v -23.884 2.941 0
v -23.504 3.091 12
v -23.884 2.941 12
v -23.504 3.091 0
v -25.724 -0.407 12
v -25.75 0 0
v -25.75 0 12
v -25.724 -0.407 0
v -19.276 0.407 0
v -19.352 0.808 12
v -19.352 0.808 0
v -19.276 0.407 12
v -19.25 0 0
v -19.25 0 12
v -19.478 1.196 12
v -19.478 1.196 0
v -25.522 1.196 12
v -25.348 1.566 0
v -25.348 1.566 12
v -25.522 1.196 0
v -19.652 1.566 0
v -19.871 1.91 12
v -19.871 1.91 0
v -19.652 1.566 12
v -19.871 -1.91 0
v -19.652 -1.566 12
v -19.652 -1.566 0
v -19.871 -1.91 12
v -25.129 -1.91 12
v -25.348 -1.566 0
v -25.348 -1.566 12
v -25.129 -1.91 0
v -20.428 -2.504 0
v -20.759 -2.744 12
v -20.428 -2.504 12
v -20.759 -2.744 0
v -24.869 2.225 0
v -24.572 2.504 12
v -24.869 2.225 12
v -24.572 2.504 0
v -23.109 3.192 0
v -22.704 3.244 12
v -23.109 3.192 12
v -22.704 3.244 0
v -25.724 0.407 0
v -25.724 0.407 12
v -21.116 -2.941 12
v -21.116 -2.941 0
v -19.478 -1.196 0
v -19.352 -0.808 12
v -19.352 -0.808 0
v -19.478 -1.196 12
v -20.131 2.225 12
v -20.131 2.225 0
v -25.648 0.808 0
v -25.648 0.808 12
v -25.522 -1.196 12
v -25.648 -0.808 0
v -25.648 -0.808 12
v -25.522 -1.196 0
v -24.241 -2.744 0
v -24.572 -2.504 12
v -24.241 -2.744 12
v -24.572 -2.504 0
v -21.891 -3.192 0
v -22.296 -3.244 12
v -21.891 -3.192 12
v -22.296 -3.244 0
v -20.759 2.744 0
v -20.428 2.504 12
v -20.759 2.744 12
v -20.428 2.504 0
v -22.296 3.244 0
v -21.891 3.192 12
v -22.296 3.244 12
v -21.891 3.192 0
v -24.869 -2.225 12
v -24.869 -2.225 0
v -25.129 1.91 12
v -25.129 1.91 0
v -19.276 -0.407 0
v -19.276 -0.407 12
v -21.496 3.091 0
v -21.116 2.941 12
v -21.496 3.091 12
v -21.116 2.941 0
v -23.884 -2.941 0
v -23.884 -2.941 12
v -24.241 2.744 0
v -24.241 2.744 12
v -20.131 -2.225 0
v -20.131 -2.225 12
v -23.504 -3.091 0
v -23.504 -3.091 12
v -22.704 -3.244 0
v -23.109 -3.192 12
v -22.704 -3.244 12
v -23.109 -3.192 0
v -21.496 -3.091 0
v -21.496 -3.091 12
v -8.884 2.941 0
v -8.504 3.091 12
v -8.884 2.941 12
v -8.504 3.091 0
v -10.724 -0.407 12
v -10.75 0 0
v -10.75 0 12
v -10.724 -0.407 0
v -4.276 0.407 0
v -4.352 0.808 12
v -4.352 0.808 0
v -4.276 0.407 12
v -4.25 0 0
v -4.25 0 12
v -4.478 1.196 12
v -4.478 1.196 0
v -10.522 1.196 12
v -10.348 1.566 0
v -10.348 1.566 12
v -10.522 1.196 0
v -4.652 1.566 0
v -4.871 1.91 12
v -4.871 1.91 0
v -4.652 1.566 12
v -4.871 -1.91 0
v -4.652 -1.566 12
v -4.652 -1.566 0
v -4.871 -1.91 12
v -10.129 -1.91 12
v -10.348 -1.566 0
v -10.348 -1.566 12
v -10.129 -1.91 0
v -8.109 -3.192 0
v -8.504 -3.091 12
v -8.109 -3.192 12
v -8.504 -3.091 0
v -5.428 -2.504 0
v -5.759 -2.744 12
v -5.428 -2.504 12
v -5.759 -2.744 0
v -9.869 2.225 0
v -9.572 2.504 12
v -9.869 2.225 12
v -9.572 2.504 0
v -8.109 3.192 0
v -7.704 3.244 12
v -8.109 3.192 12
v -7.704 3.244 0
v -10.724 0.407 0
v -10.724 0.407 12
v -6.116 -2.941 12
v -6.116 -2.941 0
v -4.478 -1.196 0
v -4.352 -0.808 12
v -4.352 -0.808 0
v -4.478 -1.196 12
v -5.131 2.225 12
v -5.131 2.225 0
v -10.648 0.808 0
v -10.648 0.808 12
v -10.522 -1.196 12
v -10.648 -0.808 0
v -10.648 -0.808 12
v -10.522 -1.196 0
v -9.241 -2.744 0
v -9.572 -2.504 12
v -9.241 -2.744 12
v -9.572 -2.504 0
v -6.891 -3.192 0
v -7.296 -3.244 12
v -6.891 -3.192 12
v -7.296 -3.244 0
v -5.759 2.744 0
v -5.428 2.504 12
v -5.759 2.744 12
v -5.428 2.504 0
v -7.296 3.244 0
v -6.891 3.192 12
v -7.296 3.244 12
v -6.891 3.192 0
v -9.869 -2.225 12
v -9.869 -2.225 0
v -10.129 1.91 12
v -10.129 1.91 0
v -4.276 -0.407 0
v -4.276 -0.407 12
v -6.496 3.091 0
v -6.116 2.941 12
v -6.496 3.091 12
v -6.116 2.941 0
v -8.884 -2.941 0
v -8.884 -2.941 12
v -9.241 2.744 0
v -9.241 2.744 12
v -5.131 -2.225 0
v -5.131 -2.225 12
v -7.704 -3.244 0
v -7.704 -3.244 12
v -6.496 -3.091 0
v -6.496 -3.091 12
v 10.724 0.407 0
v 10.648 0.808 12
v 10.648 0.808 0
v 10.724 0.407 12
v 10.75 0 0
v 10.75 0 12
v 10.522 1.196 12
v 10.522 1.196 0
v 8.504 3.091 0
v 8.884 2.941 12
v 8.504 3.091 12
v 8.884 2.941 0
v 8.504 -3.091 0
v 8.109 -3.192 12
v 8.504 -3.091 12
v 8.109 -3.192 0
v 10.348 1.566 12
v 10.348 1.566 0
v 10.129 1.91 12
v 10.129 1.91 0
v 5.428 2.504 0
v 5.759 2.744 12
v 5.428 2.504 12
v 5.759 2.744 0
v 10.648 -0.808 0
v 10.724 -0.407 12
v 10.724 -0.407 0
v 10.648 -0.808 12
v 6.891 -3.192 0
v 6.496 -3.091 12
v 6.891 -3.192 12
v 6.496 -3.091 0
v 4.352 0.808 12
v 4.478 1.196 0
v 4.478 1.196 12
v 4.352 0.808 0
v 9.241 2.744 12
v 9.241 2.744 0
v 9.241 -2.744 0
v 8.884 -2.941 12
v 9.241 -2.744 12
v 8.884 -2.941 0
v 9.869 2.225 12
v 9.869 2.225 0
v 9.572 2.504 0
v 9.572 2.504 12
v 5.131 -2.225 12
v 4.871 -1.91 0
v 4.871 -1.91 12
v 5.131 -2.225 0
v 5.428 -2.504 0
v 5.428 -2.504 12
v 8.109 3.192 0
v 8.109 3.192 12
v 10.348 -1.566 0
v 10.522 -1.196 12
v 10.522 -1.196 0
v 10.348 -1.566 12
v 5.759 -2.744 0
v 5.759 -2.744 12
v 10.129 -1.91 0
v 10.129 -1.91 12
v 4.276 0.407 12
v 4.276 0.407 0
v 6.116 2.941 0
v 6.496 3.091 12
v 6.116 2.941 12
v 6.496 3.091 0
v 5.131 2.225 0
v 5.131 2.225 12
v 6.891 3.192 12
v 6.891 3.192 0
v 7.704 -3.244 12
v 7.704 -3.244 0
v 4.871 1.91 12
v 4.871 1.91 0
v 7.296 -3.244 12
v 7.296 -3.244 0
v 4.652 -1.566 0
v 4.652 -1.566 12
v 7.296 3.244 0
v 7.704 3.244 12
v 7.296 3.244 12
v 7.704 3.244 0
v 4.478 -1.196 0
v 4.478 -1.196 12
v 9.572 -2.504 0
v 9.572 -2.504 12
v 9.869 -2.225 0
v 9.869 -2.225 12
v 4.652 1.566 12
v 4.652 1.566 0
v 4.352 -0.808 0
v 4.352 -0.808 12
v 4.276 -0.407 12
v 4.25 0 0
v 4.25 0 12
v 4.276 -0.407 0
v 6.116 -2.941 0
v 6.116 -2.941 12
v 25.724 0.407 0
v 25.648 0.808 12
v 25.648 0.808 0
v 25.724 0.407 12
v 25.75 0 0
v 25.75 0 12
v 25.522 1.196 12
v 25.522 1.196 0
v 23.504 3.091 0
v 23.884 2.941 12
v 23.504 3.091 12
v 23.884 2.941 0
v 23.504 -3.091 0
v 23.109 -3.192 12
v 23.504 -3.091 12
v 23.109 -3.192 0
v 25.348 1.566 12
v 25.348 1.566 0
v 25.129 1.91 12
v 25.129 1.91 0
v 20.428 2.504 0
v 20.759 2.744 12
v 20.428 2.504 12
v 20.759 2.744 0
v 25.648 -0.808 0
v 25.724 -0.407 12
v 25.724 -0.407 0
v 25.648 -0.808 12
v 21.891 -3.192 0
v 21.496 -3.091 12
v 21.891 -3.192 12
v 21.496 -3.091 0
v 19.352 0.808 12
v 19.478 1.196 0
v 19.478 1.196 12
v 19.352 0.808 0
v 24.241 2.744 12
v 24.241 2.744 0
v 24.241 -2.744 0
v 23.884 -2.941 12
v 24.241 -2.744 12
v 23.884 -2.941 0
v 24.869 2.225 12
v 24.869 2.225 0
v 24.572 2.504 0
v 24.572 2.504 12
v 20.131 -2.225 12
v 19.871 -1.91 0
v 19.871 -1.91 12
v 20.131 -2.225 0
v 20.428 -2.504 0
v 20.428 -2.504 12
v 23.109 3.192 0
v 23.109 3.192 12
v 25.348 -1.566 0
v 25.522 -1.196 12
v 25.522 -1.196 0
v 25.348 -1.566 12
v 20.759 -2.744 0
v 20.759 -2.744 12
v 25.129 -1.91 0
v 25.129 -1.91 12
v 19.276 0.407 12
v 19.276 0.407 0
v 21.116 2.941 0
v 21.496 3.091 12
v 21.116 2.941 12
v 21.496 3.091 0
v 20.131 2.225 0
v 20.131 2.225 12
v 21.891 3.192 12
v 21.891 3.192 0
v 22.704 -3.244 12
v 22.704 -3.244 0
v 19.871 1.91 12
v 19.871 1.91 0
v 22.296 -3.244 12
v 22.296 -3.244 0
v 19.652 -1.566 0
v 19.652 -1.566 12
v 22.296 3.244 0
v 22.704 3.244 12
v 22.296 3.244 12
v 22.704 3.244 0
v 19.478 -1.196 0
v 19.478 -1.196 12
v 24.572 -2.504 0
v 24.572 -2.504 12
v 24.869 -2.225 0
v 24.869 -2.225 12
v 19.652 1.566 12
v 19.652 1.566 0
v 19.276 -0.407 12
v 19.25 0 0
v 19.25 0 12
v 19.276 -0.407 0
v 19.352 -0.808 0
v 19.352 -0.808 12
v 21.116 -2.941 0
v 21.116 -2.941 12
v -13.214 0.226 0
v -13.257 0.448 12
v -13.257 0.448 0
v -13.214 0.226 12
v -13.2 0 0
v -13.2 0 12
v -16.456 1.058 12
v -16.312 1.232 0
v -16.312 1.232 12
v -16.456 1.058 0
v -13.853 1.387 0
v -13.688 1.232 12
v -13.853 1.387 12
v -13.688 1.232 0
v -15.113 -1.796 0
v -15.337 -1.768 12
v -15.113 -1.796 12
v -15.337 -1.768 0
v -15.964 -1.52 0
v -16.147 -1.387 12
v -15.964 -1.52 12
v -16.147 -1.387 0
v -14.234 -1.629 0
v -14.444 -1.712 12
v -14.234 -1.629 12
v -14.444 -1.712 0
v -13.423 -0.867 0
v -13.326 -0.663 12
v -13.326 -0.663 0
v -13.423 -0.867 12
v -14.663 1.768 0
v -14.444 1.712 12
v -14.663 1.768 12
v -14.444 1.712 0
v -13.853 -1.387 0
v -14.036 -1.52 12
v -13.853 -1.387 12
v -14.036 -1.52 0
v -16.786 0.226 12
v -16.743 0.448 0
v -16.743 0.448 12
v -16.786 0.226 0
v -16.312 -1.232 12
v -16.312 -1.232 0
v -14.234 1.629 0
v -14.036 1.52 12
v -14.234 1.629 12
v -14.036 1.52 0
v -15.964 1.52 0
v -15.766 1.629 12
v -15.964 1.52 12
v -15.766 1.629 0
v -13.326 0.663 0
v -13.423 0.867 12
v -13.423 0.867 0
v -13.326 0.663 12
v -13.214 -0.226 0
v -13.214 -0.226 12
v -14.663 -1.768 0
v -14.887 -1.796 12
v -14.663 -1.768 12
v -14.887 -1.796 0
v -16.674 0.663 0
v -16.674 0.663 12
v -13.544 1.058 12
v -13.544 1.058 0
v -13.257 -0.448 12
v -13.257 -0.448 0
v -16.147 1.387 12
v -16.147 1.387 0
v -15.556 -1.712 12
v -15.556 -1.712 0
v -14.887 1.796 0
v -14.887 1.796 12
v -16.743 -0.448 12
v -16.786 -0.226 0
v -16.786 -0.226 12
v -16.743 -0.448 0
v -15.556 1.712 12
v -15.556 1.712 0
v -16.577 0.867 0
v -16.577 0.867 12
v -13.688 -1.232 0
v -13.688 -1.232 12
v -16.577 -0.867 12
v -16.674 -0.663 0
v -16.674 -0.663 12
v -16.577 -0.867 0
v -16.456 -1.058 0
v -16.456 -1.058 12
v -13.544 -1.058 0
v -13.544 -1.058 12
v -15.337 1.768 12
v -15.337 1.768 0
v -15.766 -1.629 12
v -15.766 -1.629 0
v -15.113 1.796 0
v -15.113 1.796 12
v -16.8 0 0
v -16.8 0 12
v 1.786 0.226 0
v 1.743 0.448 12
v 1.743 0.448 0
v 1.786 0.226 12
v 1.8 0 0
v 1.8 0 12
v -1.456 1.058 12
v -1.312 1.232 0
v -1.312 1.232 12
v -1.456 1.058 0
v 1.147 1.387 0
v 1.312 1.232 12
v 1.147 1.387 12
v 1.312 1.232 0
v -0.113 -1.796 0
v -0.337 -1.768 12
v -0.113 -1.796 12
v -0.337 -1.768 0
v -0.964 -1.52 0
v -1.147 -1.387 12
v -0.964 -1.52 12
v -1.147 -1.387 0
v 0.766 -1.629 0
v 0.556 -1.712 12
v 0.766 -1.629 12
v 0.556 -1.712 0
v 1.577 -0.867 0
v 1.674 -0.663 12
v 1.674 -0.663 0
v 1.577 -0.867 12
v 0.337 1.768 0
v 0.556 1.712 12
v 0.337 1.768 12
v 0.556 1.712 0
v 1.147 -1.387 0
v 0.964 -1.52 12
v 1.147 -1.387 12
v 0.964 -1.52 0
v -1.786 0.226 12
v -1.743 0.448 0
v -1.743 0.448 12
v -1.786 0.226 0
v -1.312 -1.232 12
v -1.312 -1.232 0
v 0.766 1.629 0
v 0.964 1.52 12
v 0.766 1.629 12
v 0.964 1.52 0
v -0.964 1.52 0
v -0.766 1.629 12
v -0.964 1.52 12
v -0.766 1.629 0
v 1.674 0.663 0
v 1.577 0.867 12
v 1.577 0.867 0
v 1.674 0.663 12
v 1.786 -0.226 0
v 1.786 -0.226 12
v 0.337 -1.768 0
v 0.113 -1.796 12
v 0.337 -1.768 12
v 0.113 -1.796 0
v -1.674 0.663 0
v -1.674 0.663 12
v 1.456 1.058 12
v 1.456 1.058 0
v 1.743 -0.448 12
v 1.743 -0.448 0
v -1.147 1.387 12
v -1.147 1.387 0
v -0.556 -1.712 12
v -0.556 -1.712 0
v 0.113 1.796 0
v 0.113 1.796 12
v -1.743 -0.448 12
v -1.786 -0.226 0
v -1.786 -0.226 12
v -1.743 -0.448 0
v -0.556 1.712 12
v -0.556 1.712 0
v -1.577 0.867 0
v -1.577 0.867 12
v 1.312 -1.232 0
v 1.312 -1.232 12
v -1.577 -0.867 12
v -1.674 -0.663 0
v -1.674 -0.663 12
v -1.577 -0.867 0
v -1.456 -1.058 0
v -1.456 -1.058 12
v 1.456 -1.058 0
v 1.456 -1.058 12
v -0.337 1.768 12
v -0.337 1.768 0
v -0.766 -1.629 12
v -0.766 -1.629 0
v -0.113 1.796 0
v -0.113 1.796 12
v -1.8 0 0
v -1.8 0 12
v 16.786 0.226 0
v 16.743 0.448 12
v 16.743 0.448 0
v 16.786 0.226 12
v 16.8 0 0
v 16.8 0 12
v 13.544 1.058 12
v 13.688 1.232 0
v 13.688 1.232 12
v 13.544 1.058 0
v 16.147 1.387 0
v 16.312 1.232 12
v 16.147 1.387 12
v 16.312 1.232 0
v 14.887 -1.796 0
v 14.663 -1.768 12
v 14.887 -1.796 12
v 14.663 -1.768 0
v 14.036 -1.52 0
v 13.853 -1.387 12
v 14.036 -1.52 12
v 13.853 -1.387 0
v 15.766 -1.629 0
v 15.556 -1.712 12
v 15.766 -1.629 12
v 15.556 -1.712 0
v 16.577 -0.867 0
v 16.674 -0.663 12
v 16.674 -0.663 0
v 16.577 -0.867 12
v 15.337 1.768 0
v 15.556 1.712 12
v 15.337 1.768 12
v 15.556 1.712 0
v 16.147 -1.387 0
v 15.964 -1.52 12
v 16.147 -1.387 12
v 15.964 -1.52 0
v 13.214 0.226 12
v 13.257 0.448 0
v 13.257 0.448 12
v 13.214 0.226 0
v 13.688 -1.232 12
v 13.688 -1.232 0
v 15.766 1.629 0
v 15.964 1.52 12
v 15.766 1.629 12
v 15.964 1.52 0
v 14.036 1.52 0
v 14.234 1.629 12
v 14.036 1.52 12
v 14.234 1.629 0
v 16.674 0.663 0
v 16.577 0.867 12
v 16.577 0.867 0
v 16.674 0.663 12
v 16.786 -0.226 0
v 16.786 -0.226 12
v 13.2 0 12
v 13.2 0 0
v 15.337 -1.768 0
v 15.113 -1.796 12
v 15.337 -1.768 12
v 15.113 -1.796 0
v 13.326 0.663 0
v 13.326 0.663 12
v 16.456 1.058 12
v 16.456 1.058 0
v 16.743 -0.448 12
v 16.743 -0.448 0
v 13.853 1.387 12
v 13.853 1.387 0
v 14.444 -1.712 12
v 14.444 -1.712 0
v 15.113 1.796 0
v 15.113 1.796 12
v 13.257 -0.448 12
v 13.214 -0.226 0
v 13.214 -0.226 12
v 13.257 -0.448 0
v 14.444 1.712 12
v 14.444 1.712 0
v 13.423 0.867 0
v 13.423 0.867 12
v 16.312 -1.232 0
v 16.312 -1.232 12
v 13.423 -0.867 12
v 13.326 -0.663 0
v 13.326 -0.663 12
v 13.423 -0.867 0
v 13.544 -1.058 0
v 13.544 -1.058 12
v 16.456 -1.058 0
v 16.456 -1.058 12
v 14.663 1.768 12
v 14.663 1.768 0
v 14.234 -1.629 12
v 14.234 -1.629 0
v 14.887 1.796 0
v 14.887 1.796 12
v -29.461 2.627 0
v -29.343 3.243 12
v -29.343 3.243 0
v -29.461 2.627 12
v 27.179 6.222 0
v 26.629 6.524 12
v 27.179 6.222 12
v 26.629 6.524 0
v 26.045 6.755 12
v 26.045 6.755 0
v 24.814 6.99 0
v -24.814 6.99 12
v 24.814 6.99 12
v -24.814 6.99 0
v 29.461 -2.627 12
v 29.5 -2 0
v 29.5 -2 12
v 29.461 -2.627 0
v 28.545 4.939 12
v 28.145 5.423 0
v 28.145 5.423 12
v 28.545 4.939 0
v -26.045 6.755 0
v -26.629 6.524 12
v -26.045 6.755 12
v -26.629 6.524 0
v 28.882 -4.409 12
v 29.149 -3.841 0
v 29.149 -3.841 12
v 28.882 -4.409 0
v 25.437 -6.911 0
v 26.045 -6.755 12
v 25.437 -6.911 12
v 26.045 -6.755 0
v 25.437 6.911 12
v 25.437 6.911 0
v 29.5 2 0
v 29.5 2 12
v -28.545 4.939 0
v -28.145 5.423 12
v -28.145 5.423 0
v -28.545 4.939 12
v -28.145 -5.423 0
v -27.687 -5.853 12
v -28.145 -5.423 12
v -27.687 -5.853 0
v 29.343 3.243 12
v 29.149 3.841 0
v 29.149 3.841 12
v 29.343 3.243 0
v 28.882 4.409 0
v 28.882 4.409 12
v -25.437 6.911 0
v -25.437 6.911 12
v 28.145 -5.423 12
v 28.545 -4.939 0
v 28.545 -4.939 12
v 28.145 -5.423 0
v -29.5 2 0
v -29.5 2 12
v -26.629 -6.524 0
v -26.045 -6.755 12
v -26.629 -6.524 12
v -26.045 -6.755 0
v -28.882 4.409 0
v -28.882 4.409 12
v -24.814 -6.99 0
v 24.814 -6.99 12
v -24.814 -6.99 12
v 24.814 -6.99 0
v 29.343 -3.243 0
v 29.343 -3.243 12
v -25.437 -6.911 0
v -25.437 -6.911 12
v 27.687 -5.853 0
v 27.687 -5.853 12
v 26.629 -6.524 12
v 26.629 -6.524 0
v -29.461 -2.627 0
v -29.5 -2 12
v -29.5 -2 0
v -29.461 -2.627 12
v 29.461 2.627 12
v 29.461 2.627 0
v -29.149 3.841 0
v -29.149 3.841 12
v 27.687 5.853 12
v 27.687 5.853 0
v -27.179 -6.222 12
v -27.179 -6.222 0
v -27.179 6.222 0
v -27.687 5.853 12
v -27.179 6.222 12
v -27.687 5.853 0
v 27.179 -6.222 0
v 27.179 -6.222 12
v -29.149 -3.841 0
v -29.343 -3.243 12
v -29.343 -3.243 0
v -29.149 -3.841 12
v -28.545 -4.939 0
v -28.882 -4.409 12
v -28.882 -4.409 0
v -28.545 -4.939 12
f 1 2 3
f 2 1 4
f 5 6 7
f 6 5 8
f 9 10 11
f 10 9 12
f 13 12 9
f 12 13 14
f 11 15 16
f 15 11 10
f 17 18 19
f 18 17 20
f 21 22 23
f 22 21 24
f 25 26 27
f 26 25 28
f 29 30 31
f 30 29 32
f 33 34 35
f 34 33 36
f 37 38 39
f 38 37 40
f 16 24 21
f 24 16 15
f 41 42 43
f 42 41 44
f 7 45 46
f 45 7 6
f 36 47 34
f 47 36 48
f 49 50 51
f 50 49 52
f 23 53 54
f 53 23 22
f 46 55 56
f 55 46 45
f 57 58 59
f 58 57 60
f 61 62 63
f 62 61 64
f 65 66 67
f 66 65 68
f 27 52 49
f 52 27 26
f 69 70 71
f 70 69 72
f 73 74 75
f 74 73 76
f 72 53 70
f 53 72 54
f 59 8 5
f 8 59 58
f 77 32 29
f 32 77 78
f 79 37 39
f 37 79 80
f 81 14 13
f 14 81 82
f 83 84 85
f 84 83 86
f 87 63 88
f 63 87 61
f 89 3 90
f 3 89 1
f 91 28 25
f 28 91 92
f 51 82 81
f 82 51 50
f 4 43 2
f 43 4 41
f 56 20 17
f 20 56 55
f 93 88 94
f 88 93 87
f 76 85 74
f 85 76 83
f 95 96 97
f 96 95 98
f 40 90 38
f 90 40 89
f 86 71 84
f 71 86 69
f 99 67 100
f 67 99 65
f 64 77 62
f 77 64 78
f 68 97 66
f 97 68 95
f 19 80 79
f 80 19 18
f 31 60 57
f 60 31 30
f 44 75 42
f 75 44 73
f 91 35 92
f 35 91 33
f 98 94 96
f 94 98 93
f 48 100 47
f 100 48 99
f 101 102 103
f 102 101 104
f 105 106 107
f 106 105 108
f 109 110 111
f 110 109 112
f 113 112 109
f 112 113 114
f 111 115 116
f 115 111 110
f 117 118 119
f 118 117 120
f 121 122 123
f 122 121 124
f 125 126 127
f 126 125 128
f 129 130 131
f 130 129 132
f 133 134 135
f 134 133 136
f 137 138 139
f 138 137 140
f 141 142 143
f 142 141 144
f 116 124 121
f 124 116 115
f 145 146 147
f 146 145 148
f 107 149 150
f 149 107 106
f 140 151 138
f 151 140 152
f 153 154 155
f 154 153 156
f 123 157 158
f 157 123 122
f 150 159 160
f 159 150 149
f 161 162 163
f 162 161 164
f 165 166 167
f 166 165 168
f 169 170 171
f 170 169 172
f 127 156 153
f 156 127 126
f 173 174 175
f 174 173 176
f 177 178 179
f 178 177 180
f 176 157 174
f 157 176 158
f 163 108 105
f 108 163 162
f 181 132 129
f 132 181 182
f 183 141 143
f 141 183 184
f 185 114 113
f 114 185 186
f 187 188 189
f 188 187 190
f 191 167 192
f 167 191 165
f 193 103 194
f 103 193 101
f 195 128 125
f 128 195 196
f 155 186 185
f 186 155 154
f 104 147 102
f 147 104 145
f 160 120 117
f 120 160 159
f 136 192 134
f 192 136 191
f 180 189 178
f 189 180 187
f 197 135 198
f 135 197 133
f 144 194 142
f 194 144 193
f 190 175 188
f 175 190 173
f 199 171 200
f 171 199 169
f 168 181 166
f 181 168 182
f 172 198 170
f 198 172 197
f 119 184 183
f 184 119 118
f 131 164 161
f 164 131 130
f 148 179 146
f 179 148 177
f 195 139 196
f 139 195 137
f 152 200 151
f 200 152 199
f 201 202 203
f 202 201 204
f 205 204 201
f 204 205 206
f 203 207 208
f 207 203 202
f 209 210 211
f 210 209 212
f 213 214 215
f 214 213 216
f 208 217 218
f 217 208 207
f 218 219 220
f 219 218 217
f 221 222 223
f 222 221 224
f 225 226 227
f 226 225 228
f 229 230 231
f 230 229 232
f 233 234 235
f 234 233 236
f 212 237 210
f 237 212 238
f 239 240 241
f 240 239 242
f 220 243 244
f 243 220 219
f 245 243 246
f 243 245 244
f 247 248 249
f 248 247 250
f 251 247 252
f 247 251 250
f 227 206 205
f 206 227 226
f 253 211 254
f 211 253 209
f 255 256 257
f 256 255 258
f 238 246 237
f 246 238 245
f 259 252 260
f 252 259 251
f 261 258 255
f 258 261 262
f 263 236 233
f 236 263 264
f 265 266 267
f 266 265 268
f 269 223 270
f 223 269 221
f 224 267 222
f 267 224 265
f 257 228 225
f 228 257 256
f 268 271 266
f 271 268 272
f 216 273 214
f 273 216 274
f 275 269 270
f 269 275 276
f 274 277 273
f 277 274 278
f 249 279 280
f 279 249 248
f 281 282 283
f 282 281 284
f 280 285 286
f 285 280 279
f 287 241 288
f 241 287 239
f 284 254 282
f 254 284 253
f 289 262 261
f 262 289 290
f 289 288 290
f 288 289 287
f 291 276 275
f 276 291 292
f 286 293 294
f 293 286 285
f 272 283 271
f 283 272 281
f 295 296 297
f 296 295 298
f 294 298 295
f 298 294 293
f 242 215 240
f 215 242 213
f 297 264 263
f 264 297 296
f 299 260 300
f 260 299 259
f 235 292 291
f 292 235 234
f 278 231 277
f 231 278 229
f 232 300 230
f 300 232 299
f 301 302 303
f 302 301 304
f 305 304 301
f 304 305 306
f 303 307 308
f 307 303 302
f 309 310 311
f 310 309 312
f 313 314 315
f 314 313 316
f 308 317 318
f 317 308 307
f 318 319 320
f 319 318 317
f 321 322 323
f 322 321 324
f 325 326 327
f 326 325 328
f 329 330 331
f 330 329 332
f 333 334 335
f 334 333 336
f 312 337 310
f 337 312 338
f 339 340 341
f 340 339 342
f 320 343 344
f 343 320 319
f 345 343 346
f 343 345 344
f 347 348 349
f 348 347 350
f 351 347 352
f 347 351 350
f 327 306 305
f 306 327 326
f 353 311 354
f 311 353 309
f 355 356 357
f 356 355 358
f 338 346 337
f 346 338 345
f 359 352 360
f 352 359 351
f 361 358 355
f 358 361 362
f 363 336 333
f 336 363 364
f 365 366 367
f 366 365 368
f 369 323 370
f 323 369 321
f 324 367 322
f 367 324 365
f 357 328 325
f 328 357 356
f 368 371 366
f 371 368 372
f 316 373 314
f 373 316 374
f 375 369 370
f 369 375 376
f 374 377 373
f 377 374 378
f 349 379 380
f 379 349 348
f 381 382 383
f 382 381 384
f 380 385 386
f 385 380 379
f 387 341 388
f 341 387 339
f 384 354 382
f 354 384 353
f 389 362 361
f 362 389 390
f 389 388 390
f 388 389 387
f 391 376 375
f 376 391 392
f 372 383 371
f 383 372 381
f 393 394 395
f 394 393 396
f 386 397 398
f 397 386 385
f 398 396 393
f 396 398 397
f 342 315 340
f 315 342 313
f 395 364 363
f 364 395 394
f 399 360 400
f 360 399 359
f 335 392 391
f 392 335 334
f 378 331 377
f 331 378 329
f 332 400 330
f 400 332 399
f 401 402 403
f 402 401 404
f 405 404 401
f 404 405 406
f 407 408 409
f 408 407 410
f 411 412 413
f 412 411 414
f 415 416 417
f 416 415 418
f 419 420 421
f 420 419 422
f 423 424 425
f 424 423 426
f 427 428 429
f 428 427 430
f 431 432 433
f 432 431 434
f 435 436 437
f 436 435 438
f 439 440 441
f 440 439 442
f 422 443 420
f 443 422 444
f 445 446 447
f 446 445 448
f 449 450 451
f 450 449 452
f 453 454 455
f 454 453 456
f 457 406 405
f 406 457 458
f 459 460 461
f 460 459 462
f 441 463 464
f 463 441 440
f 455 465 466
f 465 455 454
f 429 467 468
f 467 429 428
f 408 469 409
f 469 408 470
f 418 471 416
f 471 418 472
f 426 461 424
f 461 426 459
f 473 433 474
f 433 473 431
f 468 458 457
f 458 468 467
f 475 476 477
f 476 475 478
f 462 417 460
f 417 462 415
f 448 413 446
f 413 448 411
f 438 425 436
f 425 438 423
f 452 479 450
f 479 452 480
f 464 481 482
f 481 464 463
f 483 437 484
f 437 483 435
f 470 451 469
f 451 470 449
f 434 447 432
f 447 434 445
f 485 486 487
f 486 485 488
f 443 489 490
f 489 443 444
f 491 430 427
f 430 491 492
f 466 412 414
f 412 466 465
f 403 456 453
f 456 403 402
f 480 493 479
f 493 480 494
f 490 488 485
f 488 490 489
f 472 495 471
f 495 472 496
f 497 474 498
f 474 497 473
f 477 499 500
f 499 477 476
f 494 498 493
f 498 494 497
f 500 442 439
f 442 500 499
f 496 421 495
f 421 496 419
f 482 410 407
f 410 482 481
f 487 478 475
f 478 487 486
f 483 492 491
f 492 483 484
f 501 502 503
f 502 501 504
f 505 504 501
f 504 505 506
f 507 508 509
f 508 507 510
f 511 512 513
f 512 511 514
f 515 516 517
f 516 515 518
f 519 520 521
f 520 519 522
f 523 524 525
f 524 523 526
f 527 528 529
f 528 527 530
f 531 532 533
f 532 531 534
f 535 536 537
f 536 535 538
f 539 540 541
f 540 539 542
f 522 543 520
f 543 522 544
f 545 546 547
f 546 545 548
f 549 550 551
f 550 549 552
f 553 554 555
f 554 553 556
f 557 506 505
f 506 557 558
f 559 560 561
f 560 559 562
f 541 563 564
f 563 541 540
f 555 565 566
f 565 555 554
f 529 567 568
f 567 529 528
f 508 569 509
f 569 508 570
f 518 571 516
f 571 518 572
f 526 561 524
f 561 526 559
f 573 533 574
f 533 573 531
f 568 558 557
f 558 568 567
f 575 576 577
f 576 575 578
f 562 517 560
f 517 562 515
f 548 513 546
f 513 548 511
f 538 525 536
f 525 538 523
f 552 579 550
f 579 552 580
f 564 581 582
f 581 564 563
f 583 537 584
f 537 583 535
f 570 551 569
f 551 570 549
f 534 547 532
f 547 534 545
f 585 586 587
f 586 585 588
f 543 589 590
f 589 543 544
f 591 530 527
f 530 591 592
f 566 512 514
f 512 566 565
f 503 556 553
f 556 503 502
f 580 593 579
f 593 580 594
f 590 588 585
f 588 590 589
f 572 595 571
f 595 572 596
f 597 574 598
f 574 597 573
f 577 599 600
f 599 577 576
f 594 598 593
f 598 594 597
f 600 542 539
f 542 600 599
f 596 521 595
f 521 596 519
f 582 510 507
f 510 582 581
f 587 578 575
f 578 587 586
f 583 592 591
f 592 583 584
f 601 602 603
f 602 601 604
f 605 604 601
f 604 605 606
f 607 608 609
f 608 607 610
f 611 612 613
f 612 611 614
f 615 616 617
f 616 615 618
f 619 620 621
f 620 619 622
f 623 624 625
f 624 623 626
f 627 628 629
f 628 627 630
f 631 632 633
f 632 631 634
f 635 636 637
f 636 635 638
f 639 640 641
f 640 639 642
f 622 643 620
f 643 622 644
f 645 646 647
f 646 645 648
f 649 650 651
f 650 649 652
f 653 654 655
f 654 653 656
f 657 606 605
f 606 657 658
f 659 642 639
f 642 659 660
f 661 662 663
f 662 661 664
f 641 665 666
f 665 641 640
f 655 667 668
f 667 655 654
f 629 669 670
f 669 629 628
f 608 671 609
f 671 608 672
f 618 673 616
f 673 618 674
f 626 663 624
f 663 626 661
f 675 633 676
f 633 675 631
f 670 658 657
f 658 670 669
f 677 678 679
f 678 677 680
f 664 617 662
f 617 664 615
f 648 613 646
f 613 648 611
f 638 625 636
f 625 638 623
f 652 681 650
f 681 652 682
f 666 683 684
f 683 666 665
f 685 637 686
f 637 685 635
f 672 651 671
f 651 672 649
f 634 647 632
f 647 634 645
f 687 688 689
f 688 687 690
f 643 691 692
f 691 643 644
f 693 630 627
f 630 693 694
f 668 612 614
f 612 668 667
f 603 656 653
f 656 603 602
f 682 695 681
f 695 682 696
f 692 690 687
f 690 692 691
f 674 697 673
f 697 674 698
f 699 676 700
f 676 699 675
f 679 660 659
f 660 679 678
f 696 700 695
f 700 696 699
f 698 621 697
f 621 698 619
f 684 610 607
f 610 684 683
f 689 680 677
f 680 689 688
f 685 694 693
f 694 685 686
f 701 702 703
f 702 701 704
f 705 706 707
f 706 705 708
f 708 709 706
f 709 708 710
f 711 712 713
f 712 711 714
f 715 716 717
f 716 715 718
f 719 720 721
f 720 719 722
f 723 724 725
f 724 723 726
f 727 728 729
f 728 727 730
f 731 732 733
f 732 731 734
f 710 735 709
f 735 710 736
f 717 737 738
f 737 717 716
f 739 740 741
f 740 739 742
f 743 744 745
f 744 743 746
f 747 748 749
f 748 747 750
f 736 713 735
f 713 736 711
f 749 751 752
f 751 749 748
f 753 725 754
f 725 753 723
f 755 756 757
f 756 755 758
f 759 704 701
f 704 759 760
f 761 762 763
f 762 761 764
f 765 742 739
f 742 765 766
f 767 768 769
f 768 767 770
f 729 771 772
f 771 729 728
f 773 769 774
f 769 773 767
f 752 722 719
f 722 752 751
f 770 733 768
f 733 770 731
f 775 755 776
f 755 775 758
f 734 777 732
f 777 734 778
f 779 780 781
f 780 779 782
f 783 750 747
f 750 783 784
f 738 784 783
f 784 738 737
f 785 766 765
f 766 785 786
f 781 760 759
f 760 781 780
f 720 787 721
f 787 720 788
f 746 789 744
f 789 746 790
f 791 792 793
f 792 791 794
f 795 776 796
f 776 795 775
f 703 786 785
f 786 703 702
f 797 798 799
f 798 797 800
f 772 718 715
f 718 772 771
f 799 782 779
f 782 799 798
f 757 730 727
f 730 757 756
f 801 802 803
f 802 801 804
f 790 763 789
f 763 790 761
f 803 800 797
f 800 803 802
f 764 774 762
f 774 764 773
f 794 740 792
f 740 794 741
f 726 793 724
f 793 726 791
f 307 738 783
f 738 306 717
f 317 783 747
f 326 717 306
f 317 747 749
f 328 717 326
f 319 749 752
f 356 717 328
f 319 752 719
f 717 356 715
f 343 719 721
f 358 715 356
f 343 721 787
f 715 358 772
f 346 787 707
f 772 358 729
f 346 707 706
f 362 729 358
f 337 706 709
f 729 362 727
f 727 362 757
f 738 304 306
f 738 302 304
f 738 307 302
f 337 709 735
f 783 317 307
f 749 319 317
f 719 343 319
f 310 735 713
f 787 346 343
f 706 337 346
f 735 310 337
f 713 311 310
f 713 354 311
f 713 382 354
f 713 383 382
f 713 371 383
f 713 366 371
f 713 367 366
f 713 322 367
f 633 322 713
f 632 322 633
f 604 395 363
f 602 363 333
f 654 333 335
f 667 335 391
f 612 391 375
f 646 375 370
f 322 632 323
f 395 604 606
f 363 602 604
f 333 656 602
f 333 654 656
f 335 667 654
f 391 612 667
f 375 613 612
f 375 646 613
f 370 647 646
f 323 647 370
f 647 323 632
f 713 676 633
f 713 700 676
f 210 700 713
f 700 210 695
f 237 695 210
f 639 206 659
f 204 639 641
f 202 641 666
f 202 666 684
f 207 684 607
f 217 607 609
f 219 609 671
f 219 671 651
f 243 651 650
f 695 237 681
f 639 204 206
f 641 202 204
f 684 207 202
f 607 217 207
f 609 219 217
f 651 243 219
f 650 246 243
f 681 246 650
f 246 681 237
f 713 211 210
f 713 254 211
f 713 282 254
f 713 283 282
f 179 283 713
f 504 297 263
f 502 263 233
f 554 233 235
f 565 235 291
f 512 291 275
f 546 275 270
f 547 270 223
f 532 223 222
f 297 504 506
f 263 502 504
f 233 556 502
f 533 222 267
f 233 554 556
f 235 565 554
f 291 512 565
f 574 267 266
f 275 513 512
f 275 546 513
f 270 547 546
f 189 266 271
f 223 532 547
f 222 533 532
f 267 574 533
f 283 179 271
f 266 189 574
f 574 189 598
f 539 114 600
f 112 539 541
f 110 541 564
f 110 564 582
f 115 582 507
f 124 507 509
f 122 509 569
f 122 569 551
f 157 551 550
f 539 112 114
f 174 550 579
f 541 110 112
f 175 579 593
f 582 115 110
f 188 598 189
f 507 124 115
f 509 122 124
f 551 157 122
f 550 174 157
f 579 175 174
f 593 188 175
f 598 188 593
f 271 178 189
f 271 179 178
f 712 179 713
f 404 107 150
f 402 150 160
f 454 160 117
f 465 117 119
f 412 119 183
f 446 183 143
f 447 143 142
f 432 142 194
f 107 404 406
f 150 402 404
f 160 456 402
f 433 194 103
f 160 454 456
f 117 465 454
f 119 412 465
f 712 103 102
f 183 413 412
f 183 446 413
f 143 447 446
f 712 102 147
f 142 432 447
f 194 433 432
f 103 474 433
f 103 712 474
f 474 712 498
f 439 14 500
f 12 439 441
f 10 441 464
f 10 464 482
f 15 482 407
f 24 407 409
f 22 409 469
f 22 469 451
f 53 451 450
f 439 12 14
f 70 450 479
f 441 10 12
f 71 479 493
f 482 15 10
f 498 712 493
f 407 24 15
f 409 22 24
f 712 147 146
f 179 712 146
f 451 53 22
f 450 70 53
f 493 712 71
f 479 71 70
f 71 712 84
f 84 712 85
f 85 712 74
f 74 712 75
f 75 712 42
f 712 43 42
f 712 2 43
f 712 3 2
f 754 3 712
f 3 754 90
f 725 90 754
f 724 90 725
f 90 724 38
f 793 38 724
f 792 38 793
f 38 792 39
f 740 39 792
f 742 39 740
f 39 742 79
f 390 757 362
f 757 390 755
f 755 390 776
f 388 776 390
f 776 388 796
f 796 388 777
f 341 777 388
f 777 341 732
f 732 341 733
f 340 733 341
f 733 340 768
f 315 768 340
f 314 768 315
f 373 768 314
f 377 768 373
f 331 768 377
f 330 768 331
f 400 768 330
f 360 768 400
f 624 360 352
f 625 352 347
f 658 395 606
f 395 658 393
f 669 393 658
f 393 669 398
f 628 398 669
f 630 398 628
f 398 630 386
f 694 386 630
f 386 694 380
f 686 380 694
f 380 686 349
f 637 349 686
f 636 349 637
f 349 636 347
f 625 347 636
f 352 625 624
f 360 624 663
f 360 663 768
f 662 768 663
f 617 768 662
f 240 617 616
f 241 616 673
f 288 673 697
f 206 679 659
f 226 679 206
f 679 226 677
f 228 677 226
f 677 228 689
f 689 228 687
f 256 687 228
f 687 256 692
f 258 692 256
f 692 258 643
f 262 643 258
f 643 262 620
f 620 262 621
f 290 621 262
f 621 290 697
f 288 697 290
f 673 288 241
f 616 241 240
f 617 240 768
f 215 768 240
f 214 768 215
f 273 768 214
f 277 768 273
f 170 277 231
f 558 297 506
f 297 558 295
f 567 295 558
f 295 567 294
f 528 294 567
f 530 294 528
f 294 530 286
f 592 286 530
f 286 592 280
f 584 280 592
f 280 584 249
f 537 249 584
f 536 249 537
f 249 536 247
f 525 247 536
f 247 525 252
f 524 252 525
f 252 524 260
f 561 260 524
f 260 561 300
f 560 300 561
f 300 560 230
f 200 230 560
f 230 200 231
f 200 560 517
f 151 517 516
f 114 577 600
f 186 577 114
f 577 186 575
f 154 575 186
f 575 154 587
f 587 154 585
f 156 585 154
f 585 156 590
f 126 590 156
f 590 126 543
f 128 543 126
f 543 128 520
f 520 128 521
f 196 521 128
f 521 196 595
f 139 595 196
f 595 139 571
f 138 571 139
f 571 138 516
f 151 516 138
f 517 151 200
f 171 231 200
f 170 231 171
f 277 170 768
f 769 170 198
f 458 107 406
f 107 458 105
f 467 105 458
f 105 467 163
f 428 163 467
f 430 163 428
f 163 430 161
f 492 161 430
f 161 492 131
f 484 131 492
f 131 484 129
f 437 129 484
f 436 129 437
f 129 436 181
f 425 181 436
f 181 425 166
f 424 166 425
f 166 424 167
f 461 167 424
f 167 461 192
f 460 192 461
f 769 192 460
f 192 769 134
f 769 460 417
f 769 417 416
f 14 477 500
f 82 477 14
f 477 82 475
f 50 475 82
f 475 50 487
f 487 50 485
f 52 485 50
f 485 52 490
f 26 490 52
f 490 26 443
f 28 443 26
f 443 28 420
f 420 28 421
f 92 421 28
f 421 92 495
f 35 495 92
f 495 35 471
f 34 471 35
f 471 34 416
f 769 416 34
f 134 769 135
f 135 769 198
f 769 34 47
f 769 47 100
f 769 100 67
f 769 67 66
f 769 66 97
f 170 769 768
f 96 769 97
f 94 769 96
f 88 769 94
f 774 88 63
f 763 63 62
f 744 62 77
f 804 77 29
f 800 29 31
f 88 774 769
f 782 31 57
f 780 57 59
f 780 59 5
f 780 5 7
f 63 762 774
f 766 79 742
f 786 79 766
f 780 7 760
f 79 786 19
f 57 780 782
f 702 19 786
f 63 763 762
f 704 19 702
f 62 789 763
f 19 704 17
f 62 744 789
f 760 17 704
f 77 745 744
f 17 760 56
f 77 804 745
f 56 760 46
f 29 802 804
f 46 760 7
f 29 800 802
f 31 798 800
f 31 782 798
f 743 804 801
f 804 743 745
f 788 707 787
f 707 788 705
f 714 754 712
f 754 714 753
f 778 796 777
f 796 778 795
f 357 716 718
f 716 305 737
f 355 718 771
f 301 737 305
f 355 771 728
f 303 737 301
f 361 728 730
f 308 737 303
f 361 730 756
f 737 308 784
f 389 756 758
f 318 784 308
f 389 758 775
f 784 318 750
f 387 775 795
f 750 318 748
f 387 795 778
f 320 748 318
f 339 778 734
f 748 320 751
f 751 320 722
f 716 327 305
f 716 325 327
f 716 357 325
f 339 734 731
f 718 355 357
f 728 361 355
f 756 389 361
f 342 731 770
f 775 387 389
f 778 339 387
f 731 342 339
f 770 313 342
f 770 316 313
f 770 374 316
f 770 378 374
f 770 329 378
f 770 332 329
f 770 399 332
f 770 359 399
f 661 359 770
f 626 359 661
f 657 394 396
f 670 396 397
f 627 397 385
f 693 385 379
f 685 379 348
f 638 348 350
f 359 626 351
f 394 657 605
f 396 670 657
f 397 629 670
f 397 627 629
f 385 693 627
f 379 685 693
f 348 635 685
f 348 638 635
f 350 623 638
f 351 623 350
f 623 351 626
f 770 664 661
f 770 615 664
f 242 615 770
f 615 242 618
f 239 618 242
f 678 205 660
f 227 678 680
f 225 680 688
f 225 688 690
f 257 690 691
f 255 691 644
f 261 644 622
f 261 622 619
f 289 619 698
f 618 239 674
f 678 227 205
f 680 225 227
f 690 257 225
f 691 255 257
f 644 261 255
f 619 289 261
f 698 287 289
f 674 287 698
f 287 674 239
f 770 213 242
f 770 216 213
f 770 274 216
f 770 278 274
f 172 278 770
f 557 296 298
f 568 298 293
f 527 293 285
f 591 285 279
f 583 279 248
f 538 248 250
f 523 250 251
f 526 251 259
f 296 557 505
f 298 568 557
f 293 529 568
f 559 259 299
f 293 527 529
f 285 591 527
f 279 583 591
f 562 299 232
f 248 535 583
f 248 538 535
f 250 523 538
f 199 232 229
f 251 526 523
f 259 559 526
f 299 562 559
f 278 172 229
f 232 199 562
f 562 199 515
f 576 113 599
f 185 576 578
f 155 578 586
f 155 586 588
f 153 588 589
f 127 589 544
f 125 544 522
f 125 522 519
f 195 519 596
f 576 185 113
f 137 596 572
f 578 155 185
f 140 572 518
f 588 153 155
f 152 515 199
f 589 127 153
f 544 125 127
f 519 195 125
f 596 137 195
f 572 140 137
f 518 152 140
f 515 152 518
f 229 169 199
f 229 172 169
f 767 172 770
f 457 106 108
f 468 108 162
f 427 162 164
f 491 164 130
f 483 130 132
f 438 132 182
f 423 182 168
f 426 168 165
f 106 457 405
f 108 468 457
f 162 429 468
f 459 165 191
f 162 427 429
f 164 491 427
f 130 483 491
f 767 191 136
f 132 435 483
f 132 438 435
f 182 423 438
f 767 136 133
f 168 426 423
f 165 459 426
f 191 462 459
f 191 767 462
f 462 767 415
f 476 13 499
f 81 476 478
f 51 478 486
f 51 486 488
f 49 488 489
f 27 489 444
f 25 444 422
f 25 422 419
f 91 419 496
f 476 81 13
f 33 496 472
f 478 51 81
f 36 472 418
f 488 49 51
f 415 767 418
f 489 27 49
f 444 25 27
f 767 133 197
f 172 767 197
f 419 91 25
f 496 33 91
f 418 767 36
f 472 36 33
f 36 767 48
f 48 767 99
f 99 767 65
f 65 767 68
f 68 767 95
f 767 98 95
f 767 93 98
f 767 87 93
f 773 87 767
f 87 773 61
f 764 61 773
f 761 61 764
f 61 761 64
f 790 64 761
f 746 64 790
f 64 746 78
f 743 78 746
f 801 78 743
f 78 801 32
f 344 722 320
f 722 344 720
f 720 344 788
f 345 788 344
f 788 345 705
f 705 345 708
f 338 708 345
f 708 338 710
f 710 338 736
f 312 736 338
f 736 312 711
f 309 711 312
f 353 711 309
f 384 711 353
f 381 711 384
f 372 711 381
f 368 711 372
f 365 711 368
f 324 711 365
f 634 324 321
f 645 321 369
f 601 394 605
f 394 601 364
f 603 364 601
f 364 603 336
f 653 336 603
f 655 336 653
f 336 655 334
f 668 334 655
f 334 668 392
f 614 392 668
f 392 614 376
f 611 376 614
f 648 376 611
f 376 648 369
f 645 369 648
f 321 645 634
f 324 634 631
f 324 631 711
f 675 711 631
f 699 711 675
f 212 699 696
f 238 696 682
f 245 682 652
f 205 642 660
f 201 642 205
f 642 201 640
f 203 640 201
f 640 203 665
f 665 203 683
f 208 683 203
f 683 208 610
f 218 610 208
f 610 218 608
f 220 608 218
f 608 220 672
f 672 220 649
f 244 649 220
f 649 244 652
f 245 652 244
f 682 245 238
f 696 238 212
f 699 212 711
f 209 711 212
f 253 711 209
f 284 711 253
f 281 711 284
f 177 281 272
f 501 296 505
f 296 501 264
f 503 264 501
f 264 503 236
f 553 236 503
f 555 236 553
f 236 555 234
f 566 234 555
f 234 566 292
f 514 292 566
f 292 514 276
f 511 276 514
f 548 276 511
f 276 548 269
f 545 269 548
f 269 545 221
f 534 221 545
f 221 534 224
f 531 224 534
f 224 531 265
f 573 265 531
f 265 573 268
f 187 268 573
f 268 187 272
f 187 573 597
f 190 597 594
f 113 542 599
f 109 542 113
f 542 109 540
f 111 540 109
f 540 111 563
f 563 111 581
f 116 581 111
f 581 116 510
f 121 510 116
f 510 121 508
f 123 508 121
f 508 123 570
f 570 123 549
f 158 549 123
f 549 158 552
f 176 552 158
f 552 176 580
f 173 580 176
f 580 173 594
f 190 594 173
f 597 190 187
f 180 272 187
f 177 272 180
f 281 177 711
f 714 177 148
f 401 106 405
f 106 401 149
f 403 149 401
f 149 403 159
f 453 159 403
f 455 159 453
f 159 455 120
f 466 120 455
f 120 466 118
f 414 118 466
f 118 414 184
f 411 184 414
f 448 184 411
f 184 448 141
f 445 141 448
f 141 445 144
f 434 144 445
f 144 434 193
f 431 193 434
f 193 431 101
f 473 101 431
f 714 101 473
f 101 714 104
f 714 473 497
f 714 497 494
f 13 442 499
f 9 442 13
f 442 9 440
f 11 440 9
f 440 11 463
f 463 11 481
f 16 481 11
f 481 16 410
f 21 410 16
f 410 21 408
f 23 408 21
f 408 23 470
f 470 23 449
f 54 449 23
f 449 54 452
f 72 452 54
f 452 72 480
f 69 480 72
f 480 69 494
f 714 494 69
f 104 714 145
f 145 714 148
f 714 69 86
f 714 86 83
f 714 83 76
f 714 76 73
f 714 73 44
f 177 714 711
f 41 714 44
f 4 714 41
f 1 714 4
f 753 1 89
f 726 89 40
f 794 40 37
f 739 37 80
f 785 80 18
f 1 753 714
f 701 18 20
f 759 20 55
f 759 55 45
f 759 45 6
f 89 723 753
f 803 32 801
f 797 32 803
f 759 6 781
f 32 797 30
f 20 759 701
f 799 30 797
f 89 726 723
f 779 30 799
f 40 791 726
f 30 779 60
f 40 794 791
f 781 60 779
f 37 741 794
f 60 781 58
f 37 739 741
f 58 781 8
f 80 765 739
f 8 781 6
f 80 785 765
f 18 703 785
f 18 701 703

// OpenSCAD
$fn = 50;


difference() {
	union() {
		*color(alpha = 1.0000000000, c = "gray") {
			translate(v = [0, 7, 0]) {
				linear_extrude(height = 1) {
					text(font = "Arial:style=Bold", halign = "center", size = 4.5000000000, text = "COMMENT plate main", valign = "center");
				}
			}
		}
		*color(alpha = 1.0000000000, c = "gray") {
			translate(v = [0, 14, 0]) {
				linear_extrude(height = 1) {
					text(font = "Arial:style=Bold", halign = "center", size = 4.5000000000, text = "COMMENT description oobb_plate_shape_p_type_12_depth_4_width_1_height_12_thickness_true_both_holes", valign = "center");
				}
			}
		}
		hull() {
			translate(v = [-24.5000000000, 2.0000000000, 0]) {
				cylinder(h = 12, r = 5);
			}
			translate(v = [24.5000000000, 2.0000000000, 0]) {
				cylinder(h = 12, r = 5);
			}
			translate(v = [-24.5000000000, -2.0000000000, 0]) {
				cylinder(h = 12, r = 5);
			}
			translate(v = [24.5000000000, -2.0000000000, 0]) {
				cylinder(h = 12, r = 5);
			}
		}
	}
	union() {
		*color(alpha = 1.0000000000, c = "gray") {
			translate(v = [0, 7, 0]) {
				linear_extrude(height = 1) {
					text(font = "Arial:style=Bold", halign = "center", size = 4.5000000000, text = "COMMENT holes main", valign = "center");
				}
			}
		}
		*color(alpha = 1.0000000000, c = "gray") {
			translate(v = [0, 14, 0]) {
				linear_extrude(height = 1) {
					text(font = "Arial:style=Bold", halign = "center", size = 4.5000000000, text = "COMMENT description oobb_holes_shape_n_type_4_width_1_height_12_thickness_true_both_holes", valign = "center");
				}
			}
		}
		translate(v = [-22.5000000000, 0.0000000000, 0]) {
			translate(v = [0, 0, -50]) {
				cylinder(h = 100, r = 3.2500000000);
			}
		}
		translate(v = [-7.5000000000, 0.0000000000, 0]) {
			translate(v = [0, 0, -50]) {
				cylinder(h = 100, r = 3.2500000000);
			}
		}
		translate(v = [7.5000000000, 0.0000000000, 0]) {
			translate(v = [0, 0, -50]) {
				cylinder(h = 100, r = 3.2500000000);
			}
		}
		translate(v = [22.5000000000, 0.0000000000, 0]) {
			translate(v = [0, 0, -50]) {
				cylinder(h = 100, r = 3.2500000000);
			}
		}
		translate(v = [-22.5000000000, 0.0000000000, 0]) {
			translate(v = [0, 0, -50]) {
				cylinder(h = 100, r = 1.8000000000);
			}
		}
		translate(v = [-15.0000000000, 0.0000000000, 0]) {
			translate(v = [0, 0, -50]) {
				cylinder(h = 100, r = 1.8000000000);
			}
		}
		translate(v = [-7.5000000000, 0.0000000000, 0]) {
			translate(v = [0, 0, -50]) {
				cylinder(h = 100, r = 1.8000000000);
			}
		}
		translate(v = [0, 0, -50]) {
			cylinder(h = 100, r = 1.8000000000);
		}
		translate(v = [7.5000000000, 0.0000000000, 0]) {
			translate(v = [0, 0, -50]) {
				cylinder(h = 100, r = 1.8000000000);
			}
		}
		translate(v = [15.0000000000, 0.0000000000, 0]) {
			translate(v = [0, 0, -50]) {
				cylinder(h = 100, r = 1.8000000000);
			}
		}
		translate(v = [22.5000000000, 0.0000000000, 0]) {
			translate(v = [0, 0, -50]) {
				cylinder(h = 100, r = 1.8000000000);
			}
		}
	}
}
